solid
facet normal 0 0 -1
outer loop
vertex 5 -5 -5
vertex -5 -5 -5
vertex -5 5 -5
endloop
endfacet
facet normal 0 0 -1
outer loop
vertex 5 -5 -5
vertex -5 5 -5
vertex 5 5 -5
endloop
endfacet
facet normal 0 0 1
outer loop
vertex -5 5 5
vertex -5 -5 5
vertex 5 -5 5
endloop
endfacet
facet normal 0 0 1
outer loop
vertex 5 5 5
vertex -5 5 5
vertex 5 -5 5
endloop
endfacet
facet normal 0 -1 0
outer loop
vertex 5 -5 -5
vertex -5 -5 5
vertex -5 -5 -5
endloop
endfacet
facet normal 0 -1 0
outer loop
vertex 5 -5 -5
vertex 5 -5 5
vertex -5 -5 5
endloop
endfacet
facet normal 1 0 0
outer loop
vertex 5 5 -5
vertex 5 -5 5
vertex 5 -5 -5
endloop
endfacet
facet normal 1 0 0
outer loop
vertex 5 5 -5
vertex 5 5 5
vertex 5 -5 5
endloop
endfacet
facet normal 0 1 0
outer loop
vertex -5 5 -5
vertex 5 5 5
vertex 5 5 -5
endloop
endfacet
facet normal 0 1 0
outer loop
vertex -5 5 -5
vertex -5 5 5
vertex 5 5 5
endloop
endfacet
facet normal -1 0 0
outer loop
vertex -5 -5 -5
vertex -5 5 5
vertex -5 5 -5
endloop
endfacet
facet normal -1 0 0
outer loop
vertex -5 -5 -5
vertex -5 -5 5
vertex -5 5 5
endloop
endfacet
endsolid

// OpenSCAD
/*
 * The linear_extrude function stretches an object based on the parameters provided.
 * Parameters:
 *      height - specifies the length at which the object will be extruded
 *      center - boolean specifying if the extrusion will be centered around the object or not
 *      convexity - specifies the maximum number of front sides (back sides) a ray intersecting the object might penetrate
 *      twist - the degree for which the extrusion is twisted around its height axis
 */
linear_extrude(height = 10, center = true, convexity = 10, twist = 0) {
    square(size = 10, center = true);
}
